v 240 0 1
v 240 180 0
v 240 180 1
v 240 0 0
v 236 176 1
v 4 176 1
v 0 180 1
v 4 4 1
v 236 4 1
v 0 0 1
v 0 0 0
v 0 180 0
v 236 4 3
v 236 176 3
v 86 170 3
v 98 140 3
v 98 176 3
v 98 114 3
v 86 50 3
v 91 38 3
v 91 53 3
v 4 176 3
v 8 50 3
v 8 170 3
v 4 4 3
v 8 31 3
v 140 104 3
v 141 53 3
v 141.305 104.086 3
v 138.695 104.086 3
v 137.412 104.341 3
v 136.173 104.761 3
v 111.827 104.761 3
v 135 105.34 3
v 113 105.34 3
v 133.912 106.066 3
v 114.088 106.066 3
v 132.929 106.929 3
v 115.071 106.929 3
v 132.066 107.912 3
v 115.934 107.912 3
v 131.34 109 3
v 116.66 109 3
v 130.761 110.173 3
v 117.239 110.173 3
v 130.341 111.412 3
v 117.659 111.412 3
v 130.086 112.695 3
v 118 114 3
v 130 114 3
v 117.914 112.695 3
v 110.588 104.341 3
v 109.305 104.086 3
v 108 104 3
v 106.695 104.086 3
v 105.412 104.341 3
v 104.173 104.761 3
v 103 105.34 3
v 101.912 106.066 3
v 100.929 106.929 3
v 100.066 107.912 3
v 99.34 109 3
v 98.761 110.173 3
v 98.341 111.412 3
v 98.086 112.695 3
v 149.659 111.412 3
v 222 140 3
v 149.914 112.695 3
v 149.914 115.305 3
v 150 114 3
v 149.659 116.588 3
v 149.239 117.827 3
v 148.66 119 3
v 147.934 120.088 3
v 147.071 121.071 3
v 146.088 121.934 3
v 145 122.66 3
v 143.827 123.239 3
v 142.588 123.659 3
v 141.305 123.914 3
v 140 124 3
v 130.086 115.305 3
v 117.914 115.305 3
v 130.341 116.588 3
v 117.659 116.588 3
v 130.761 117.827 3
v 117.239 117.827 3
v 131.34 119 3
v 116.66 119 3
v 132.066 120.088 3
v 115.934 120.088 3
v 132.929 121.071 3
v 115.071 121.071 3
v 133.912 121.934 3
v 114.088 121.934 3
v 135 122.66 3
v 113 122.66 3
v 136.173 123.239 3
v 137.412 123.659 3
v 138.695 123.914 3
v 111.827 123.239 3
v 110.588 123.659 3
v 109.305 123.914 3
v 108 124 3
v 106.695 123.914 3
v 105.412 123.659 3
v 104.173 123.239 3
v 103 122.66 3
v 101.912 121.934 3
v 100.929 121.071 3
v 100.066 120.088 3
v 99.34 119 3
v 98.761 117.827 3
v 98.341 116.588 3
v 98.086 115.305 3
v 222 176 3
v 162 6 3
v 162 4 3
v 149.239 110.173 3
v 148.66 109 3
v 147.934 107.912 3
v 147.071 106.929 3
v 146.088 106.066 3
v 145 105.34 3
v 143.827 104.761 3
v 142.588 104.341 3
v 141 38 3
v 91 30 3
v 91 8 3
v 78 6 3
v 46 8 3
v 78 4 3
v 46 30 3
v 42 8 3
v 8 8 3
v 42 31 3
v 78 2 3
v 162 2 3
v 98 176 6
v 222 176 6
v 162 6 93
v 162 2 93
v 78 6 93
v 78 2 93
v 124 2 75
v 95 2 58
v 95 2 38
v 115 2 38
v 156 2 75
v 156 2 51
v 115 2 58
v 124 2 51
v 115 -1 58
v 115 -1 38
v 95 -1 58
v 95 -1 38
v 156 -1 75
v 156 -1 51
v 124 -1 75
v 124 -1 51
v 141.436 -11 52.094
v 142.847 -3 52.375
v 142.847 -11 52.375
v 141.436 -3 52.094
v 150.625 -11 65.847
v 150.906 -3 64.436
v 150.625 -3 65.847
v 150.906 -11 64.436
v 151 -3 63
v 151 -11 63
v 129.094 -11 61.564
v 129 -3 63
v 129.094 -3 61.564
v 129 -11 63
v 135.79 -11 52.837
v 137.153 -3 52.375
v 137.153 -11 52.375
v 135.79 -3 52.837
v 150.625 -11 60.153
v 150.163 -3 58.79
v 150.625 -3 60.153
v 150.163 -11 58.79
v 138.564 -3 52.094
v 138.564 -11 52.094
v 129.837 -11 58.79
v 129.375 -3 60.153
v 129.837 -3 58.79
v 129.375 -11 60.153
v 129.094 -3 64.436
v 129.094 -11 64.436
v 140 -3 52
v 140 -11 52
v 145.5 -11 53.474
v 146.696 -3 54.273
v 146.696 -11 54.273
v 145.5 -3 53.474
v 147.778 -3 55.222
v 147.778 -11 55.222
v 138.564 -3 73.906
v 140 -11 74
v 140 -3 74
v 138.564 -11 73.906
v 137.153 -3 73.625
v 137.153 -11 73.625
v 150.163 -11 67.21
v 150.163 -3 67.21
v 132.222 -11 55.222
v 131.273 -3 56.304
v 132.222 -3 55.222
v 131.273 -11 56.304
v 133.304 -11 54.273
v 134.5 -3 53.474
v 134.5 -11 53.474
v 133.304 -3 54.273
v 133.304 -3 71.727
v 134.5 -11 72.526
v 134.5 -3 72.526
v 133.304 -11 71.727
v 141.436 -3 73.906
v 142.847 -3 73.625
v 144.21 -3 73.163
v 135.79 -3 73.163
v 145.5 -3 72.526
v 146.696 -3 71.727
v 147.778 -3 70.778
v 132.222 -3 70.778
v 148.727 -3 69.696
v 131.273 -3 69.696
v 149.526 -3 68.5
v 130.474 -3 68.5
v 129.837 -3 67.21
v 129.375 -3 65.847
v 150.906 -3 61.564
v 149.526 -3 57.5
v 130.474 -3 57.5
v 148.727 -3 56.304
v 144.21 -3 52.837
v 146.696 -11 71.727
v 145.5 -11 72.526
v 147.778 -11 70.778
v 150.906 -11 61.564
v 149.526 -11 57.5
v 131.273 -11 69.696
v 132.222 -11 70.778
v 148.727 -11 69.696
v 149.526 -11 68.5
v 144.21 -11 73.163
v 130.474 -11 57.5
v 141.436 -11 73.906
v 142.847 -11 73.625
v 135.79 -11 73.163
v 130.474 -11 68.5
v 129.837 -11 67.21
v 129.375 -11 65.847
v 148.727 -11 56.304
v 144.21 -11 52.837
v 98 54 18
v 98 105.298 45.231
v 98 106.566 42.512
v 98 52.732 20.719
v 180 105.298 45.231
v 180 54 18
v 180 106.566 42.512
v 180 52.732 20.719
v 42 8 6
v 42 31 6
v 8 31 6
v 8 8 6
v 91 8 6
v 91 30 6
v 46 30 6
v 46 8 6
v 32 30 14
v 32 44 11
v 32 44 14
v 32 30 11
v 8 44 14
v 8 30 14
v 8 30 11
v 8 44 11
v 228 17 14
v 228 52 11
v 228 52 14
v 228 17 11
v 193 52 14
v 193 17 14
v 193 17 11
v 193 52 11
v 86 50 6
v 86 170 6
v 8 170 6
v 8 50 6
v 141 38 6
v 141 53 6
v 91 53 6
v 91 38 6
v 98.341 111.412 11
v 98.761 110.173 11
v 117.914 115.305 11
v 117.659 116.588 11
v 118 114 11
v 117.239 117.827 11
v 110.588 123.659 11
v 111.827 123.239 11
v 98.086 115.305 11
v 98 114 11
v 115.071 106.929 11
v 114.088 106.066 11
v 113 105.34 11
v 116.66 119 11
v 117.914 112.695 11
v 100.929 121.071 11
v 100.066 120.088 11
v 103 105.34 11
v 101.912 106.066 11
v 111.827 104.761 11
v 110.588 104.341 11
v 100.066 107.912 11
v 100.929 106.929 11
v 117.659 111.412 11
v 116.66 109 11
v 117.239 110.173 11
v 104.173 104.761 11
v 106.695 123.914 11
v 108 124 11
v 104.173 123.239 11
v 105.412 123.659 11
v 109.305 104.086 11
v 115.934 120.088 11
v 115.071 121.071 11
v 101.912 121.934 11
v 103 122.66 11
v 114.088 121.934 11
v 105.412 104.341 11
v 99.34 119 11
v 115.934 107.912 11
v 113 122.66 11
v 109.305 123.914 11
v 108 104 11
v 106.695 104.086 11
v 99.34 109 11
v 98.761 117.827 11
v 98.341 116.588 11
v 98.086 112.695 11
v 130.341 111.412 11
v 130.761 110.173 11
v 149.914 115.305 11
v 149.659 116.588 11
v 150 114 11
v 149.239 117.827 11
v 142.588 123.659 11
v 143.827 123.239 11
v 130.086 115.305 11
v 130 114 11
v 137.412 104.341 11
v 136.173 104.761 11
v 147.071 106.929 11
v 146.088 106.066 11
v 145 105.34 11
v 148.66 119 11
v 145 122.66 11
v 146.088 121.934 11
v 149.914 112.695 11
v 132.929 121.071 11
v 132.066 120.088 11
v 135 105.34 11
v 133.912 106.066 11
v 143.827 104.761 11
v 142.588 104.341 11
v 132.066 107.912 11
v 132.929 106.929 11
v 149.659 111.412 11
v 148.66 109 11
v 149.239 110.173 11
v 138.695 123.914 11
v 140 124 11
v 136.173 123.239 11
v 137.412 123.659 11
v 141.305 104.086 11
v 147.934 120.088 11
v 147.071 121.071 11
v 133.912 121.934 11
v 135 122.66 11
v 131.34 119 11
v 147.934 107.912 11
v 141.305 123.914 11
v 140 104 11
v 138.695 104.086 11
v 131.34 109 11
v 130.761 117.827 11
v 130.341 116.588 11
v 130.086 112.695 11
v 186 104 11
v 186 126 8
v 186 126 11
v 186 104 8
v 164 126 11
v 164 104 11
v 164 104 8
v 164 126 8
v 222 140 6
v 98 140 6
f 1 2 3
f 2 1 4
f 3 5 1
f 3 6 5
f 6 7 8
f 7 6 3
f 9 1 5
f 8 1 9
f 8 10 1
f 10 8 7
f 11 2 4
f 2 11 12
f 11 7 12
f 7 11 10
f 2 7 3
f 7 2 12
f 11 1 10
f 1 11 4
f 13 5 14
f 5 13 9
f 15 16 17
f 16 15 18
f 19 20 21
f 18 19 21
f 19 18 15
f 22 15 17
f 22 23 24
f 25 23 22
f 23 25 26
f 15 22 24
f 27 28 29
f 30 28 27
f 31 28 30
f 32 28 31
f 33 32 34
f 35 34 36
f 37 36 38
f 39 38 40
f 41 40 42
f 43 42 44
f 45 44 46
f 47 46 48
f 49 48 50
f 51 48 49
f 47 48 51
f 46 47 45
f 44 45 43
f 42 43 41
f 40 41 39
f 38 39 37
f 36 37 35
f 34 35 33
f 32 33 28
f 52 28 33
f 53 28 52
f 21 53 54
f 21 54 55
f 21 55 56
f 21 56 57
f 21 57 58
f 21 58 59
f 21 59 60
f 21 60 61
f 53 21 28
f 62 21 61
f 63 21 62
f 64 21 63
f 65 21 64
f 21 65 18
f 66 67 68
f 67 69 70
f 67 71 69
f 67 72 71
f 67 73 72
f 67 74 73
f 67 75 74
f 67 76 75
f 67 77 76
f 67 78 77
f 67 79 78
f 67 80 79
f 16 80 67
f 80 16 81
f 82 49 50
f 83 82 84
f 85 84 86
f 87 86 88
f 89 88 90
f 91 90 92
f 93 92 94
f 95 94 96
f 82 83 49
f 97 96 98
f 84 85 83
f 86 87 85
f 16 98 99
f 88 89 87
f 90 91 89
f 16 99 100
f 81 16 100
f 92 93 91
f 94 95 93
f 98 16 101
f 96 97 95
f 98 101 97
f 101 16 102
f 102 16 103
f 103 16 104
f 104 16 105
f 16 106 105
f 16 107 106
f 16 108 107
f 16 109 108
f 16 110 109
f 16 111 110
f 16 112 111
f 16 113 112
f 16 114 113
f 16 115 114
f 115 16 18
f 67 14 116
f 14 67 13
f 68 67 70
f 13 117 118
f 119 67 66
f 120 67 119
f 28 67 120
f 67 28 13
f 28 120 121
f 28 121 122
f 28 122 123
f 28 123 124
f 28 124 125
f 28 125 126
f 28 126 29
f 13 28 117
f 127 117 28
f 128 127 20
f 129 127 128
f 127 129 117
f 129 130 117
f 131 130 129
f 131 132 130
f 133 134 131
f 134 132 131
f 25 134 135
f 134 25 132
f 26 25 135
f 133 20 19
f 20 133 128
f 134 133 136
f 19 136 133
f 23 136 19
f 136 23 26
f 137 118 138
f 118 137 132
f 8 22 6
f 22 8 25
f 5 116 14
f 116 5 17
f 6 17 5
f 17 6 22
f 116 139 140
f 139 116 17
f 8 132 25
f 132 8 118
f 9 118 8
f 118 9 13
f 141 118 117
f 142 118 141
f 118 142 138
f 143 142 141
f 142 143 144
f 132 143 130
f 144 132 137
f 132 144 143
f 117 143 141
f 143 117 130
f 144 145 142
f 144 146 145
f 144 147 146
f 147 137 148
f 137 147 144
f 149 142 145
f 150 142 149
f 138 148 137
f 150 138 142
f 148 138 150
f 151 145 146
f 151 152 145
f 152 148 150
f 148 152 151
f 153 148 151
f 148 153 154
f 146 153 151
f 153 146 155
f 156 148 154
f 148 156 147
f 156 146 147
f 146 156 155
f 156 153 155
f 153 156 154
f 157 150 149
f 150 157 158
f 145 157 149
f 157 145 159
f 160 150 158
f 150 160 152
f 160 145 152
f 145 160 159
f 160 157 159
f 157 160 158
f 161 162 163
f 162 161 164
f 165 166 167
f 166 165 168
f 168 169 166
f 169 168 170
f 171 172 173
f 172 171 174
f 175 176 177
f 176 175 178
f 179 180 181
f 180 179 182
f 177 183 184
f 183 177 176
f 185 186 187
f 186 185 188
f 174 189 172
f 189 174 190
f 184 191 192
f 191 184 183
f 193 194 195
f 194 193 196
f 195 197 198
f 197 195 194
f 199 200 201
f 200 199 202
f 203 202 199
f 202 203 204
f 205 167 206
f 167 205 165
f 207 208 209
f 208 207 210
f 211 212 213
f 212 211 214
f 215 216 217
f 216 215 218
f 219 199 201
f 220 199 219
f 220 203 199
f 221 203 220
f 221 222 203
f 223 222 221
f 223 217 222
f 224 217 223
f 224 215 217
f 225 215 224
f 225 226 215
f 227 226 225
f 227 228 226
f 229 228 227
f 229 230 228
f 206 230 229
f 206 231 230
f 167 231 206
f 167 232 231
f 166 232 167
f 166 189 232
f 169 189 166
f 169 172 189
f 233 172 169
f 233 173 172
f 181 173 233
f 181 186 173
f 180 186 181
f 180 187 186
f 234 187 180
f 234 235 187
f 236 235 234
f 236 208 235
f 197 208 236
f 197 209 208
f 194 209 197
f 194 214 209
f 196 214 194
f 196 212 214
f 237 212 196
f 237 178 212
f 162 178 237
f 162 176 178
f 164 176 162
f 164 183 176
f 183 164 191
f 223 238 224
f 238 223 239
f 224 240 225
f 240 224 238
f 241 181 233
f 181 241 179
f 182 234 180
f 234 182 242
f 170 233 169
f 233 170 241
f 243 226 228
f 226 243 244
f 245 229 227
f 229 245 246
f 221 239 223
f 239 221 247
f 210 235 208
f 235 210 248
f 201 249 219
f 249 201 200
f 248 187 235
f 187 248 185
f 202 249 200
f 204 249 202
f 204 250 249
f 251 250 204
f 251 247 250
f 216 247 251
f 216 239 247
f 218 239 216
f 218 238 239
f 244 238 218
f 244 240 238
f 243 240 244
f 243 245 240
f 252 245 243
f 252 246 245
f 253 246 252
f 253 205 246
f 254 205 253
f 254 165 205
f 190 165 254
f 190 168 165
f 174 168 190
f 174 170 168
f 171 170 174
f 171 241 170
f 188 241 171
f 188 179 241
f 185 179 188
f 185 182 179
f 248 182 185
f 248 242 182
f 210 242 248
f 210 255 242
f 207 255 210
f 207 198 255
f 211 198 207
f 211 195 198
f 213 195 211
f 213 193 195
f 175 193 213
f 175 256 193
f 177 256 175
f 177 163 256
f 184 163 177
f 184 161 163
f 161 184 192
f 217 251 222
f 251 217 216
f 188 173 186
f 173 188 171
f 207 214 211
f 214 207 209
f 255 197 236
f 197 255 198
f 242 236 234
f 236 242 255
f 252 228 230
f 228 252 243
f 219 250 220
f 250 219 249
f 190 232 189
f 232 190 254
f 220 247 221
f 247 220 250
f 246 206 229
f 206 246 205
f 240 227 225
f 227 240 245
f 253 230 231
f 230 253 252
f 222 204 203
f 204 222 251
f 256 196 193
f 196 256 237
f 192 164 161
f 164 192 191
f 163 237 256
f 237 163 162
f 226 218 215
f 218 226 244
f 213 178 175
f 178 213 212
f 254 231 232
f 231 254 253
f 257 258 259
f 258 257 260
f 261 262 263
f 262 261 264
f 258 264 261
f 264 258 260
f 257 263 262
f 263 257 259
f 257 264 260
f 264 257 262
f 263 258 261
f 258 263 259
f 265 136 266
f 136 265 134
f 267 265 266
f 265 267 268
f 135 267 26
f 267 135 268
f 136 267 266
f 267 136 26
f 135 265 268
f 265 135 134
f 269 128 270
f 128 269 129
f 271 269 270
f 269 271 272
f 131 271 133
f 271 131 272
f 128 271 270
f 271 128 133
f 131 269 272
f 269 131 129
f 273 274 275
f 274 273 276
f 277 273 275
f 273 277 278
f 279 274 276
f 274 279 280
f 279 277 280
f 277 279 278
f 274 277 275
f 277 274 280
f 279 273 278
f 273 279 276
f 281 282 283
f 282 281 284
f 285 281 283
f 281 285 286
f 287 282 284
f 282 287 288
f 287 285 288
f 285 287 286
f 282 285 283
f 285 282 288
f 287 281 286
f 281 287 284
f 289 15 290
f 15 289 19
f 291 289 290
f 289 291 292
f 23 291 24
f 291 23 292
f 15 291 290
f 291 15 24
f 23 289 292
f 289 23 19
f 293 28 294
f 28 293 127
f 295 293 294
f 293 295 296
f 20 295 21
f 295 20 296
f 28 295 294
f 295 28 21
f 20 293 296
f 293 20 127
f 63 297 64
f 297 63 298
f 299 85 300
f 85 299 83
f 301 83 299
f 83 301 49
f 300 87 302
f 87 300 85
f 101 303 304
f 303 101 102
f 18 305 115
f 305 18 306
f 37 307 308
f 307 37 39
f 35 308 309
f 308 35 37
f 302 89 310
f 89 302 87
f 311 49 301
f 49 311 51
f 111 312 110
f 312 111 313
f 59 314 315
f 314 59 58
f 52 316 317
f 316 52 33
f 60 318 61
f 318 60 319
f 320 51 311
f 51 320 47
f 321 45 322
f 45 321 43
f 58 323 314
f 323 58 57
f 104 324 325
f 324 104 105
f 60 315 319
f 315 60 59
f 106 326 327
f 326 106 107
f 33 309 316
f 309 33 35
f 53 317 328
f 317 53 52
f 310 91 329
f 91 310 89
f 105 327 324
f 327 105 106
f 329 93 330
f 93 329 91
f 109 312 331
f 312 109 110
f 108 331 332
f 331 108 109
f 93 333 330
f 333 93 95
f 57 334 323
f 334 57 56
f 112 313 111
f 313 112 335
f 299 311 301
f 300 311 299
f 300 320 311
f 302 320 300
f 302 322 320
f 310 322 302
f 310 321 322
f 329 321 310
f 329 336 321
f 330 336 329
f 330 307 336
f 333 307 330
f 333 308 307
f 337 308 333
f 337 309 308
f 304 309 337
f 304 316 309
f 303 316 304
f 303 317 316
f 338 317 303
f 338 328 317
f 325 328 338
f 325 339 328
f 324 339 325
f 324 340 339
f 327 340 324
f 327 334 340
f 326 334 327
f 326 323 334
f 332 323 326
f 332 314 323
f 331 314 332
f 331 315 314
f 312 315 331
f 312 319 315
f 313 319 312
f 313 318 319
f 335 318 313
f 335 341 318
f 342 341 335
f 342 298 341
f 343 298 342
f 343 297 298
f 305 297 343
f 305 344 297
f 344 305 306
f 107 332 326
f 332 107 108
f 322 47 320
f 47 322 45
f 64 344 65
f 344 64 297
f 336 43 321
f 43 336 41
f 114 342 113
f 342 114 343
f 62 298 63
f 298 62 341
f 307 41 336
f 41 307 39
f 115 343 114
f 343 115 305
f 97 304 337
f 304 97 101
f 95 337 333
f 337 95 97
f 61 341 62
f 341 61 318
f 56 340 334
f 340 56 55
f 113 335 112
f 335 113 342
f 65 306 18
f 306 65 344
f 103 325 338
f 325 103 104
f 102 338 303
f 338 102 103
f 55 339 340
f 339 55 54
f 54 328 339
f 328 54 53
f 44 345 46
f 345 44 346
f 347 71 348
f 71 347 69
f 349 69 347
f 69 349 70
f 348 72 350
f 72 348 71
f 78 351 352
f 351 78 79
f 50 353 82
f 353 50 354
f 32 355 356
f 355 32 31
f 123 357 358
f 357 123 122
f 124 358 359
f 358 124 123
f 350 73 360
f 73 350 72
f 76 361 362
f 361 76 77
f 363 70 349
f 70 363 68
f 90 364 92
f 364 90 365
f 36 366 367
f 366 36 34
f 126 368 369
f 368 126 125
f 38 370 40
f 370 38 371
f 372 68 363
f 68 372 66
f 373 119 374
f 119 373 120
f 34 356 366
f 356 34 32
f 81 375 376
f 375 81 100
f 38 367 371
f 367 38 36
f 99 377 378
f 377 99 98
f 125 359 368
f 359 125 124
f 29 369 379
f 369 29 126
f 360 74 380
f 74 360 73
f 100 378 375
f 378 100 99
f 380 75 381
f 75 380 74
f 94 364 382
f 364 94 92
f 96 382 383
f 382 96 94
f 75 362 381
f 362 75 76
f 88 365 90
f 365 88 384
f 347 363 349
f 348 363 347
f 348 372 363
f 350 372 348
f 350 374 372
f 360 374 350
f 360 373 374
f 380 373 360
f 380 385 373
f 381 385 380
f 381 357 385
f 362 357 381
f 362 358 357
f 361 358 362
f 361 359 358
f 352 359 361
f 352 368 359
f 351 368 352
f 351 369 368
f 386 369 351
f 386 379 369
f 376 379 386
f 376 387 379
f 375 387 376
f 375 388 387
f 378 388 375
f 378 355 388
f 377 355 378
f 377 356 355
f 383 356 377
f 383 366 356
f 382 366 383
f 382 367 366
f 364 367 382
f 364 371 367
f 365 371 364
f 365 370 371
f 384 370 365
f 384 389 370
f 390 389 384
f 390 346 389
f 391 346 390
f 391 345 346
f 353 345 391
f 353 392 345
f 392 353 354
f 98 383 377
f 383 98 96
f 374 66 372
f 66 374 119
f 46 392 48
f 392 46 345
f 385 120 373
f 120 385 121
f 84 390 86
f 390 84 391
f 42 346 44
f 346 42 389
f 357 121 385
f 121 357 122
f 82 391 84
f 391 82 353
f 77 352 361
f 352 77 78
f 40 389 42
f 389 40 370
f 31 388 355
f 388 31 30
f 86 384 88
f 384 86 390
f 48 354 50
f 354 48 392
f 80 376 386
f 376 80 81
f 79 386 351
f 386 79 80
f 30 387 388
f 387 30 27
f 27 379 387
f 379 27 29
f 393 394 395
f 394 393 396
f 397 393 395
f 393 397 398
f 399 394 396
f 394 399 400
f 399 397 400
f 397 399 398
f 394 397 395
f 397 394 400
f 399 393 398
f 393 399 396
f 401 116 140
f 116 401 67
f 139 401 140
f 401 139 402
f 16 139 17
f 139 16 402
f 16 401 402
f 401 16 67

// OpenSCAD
// Caring Node V0.5 single-board fixture concept.
// Units: mm.
// This is a planning model, not final STL. Replace module placeholders after measuring real parts.

$fn = 48;

base_x = 240;
base_y = 180;
base_z = 1;
ins_z = 2;

module_z = 3;

module_color = [0.55, 0.75, 1.0, 0.65];
raised_color = [0.55, 1.0, 0.55, 0.65];
sensor_color = [1.0, 0.72, 0.35, 0.75];
danger_color = [1.0, 0.45, 0.45, 0.65];

module_height = base_z + ins_z;

module footprint(label, x, y, sx, sy, z, h, color_v) {
  color(color_v)
    translate([x, y, z])
      cube([sx, sy, h]);
}

module plate() {
  color([0.55, 0.55, 0.55, 0.45])
    cube([base_x, base_y, base_z]);
  color([1.0, 0.95, 0.68, 0.85])
    translate([4, 4, base_z])
      cube([base_x - 8, base_y - 8, ins_z]);
}

module sensor_mast() {
  // Front mast: non-metal vertical plate carrying Rd-03 and PIR.
  color([0.55, 1.0, 0.55, 0.85])
    translate([78, 2, module_height])
      cube([84, 4, 90]);
  // Rd-03 placeholder, centered lower.
  color(sensor_color)
    translate([95, -1, module_height + 35])
      cube([20, 3, 20]);
  // PIR placeholder, higher and wider.
  color(sensor_color)
    translate([124, -1, module_height + 48])
      cube([32, 3, 24]);
  color([1, 1, 1, 0.8])
    translate([140, -3, module_height + 60])
      rotate([90, 0, 0])
        cylinder(h = 8, r = 11);
}

module tft_stand() {
  // Simple tilted TFT panel placeholder.
  color(raised_color)
    translate([98, 54, module_height + 15])
      rotate([25, 0, 0])
        cube([82, 58, 3]);
  color([0.25, 0.25, 0.25, 0.7])
    translate([102, 58, module_height + 18])
      rotate([25, 0, 0])
        cube([74, 46, 1]);
}

module button(x, y, color_v) {
  color(color_v)
    translate([x, y, module_height])
      cylinder(h = 8, r = 10);
}

plate();

// Coordinate convention in this SCAD:
// x: left to right, y: front to rear, front edge y=0.
sensor_mast();

footprint("ESP8266", 8, 8, 34, 23, module_height, module_z, raised_color);
footprint("5V power", 46, 8, 45, 22, module_height, module_z, danger_color);
footprint("BME280", 8, 30, 24, 14, module_height + 8, module_z, raised_color);
footprint("MQ", 193, 17, 35, 35, module_height + 8, module_z, sensor_color);
footprint("NUCLEO", 8, 50, 78, 120, module_height, module_z, module_color);
footprint("mini breadboard", 91, 38, 50, 15, module_height, module_z, module_color);
tft_stand();
button(108, 114, danger_color);
button(140, 114, raised_color);
footprint("buzzer", 164, 104, 22, 22, module_height + 5, module_z, raised_color);
footprint("relay", 98, 140, 124, 36, module_height, module_z, danger_color);
